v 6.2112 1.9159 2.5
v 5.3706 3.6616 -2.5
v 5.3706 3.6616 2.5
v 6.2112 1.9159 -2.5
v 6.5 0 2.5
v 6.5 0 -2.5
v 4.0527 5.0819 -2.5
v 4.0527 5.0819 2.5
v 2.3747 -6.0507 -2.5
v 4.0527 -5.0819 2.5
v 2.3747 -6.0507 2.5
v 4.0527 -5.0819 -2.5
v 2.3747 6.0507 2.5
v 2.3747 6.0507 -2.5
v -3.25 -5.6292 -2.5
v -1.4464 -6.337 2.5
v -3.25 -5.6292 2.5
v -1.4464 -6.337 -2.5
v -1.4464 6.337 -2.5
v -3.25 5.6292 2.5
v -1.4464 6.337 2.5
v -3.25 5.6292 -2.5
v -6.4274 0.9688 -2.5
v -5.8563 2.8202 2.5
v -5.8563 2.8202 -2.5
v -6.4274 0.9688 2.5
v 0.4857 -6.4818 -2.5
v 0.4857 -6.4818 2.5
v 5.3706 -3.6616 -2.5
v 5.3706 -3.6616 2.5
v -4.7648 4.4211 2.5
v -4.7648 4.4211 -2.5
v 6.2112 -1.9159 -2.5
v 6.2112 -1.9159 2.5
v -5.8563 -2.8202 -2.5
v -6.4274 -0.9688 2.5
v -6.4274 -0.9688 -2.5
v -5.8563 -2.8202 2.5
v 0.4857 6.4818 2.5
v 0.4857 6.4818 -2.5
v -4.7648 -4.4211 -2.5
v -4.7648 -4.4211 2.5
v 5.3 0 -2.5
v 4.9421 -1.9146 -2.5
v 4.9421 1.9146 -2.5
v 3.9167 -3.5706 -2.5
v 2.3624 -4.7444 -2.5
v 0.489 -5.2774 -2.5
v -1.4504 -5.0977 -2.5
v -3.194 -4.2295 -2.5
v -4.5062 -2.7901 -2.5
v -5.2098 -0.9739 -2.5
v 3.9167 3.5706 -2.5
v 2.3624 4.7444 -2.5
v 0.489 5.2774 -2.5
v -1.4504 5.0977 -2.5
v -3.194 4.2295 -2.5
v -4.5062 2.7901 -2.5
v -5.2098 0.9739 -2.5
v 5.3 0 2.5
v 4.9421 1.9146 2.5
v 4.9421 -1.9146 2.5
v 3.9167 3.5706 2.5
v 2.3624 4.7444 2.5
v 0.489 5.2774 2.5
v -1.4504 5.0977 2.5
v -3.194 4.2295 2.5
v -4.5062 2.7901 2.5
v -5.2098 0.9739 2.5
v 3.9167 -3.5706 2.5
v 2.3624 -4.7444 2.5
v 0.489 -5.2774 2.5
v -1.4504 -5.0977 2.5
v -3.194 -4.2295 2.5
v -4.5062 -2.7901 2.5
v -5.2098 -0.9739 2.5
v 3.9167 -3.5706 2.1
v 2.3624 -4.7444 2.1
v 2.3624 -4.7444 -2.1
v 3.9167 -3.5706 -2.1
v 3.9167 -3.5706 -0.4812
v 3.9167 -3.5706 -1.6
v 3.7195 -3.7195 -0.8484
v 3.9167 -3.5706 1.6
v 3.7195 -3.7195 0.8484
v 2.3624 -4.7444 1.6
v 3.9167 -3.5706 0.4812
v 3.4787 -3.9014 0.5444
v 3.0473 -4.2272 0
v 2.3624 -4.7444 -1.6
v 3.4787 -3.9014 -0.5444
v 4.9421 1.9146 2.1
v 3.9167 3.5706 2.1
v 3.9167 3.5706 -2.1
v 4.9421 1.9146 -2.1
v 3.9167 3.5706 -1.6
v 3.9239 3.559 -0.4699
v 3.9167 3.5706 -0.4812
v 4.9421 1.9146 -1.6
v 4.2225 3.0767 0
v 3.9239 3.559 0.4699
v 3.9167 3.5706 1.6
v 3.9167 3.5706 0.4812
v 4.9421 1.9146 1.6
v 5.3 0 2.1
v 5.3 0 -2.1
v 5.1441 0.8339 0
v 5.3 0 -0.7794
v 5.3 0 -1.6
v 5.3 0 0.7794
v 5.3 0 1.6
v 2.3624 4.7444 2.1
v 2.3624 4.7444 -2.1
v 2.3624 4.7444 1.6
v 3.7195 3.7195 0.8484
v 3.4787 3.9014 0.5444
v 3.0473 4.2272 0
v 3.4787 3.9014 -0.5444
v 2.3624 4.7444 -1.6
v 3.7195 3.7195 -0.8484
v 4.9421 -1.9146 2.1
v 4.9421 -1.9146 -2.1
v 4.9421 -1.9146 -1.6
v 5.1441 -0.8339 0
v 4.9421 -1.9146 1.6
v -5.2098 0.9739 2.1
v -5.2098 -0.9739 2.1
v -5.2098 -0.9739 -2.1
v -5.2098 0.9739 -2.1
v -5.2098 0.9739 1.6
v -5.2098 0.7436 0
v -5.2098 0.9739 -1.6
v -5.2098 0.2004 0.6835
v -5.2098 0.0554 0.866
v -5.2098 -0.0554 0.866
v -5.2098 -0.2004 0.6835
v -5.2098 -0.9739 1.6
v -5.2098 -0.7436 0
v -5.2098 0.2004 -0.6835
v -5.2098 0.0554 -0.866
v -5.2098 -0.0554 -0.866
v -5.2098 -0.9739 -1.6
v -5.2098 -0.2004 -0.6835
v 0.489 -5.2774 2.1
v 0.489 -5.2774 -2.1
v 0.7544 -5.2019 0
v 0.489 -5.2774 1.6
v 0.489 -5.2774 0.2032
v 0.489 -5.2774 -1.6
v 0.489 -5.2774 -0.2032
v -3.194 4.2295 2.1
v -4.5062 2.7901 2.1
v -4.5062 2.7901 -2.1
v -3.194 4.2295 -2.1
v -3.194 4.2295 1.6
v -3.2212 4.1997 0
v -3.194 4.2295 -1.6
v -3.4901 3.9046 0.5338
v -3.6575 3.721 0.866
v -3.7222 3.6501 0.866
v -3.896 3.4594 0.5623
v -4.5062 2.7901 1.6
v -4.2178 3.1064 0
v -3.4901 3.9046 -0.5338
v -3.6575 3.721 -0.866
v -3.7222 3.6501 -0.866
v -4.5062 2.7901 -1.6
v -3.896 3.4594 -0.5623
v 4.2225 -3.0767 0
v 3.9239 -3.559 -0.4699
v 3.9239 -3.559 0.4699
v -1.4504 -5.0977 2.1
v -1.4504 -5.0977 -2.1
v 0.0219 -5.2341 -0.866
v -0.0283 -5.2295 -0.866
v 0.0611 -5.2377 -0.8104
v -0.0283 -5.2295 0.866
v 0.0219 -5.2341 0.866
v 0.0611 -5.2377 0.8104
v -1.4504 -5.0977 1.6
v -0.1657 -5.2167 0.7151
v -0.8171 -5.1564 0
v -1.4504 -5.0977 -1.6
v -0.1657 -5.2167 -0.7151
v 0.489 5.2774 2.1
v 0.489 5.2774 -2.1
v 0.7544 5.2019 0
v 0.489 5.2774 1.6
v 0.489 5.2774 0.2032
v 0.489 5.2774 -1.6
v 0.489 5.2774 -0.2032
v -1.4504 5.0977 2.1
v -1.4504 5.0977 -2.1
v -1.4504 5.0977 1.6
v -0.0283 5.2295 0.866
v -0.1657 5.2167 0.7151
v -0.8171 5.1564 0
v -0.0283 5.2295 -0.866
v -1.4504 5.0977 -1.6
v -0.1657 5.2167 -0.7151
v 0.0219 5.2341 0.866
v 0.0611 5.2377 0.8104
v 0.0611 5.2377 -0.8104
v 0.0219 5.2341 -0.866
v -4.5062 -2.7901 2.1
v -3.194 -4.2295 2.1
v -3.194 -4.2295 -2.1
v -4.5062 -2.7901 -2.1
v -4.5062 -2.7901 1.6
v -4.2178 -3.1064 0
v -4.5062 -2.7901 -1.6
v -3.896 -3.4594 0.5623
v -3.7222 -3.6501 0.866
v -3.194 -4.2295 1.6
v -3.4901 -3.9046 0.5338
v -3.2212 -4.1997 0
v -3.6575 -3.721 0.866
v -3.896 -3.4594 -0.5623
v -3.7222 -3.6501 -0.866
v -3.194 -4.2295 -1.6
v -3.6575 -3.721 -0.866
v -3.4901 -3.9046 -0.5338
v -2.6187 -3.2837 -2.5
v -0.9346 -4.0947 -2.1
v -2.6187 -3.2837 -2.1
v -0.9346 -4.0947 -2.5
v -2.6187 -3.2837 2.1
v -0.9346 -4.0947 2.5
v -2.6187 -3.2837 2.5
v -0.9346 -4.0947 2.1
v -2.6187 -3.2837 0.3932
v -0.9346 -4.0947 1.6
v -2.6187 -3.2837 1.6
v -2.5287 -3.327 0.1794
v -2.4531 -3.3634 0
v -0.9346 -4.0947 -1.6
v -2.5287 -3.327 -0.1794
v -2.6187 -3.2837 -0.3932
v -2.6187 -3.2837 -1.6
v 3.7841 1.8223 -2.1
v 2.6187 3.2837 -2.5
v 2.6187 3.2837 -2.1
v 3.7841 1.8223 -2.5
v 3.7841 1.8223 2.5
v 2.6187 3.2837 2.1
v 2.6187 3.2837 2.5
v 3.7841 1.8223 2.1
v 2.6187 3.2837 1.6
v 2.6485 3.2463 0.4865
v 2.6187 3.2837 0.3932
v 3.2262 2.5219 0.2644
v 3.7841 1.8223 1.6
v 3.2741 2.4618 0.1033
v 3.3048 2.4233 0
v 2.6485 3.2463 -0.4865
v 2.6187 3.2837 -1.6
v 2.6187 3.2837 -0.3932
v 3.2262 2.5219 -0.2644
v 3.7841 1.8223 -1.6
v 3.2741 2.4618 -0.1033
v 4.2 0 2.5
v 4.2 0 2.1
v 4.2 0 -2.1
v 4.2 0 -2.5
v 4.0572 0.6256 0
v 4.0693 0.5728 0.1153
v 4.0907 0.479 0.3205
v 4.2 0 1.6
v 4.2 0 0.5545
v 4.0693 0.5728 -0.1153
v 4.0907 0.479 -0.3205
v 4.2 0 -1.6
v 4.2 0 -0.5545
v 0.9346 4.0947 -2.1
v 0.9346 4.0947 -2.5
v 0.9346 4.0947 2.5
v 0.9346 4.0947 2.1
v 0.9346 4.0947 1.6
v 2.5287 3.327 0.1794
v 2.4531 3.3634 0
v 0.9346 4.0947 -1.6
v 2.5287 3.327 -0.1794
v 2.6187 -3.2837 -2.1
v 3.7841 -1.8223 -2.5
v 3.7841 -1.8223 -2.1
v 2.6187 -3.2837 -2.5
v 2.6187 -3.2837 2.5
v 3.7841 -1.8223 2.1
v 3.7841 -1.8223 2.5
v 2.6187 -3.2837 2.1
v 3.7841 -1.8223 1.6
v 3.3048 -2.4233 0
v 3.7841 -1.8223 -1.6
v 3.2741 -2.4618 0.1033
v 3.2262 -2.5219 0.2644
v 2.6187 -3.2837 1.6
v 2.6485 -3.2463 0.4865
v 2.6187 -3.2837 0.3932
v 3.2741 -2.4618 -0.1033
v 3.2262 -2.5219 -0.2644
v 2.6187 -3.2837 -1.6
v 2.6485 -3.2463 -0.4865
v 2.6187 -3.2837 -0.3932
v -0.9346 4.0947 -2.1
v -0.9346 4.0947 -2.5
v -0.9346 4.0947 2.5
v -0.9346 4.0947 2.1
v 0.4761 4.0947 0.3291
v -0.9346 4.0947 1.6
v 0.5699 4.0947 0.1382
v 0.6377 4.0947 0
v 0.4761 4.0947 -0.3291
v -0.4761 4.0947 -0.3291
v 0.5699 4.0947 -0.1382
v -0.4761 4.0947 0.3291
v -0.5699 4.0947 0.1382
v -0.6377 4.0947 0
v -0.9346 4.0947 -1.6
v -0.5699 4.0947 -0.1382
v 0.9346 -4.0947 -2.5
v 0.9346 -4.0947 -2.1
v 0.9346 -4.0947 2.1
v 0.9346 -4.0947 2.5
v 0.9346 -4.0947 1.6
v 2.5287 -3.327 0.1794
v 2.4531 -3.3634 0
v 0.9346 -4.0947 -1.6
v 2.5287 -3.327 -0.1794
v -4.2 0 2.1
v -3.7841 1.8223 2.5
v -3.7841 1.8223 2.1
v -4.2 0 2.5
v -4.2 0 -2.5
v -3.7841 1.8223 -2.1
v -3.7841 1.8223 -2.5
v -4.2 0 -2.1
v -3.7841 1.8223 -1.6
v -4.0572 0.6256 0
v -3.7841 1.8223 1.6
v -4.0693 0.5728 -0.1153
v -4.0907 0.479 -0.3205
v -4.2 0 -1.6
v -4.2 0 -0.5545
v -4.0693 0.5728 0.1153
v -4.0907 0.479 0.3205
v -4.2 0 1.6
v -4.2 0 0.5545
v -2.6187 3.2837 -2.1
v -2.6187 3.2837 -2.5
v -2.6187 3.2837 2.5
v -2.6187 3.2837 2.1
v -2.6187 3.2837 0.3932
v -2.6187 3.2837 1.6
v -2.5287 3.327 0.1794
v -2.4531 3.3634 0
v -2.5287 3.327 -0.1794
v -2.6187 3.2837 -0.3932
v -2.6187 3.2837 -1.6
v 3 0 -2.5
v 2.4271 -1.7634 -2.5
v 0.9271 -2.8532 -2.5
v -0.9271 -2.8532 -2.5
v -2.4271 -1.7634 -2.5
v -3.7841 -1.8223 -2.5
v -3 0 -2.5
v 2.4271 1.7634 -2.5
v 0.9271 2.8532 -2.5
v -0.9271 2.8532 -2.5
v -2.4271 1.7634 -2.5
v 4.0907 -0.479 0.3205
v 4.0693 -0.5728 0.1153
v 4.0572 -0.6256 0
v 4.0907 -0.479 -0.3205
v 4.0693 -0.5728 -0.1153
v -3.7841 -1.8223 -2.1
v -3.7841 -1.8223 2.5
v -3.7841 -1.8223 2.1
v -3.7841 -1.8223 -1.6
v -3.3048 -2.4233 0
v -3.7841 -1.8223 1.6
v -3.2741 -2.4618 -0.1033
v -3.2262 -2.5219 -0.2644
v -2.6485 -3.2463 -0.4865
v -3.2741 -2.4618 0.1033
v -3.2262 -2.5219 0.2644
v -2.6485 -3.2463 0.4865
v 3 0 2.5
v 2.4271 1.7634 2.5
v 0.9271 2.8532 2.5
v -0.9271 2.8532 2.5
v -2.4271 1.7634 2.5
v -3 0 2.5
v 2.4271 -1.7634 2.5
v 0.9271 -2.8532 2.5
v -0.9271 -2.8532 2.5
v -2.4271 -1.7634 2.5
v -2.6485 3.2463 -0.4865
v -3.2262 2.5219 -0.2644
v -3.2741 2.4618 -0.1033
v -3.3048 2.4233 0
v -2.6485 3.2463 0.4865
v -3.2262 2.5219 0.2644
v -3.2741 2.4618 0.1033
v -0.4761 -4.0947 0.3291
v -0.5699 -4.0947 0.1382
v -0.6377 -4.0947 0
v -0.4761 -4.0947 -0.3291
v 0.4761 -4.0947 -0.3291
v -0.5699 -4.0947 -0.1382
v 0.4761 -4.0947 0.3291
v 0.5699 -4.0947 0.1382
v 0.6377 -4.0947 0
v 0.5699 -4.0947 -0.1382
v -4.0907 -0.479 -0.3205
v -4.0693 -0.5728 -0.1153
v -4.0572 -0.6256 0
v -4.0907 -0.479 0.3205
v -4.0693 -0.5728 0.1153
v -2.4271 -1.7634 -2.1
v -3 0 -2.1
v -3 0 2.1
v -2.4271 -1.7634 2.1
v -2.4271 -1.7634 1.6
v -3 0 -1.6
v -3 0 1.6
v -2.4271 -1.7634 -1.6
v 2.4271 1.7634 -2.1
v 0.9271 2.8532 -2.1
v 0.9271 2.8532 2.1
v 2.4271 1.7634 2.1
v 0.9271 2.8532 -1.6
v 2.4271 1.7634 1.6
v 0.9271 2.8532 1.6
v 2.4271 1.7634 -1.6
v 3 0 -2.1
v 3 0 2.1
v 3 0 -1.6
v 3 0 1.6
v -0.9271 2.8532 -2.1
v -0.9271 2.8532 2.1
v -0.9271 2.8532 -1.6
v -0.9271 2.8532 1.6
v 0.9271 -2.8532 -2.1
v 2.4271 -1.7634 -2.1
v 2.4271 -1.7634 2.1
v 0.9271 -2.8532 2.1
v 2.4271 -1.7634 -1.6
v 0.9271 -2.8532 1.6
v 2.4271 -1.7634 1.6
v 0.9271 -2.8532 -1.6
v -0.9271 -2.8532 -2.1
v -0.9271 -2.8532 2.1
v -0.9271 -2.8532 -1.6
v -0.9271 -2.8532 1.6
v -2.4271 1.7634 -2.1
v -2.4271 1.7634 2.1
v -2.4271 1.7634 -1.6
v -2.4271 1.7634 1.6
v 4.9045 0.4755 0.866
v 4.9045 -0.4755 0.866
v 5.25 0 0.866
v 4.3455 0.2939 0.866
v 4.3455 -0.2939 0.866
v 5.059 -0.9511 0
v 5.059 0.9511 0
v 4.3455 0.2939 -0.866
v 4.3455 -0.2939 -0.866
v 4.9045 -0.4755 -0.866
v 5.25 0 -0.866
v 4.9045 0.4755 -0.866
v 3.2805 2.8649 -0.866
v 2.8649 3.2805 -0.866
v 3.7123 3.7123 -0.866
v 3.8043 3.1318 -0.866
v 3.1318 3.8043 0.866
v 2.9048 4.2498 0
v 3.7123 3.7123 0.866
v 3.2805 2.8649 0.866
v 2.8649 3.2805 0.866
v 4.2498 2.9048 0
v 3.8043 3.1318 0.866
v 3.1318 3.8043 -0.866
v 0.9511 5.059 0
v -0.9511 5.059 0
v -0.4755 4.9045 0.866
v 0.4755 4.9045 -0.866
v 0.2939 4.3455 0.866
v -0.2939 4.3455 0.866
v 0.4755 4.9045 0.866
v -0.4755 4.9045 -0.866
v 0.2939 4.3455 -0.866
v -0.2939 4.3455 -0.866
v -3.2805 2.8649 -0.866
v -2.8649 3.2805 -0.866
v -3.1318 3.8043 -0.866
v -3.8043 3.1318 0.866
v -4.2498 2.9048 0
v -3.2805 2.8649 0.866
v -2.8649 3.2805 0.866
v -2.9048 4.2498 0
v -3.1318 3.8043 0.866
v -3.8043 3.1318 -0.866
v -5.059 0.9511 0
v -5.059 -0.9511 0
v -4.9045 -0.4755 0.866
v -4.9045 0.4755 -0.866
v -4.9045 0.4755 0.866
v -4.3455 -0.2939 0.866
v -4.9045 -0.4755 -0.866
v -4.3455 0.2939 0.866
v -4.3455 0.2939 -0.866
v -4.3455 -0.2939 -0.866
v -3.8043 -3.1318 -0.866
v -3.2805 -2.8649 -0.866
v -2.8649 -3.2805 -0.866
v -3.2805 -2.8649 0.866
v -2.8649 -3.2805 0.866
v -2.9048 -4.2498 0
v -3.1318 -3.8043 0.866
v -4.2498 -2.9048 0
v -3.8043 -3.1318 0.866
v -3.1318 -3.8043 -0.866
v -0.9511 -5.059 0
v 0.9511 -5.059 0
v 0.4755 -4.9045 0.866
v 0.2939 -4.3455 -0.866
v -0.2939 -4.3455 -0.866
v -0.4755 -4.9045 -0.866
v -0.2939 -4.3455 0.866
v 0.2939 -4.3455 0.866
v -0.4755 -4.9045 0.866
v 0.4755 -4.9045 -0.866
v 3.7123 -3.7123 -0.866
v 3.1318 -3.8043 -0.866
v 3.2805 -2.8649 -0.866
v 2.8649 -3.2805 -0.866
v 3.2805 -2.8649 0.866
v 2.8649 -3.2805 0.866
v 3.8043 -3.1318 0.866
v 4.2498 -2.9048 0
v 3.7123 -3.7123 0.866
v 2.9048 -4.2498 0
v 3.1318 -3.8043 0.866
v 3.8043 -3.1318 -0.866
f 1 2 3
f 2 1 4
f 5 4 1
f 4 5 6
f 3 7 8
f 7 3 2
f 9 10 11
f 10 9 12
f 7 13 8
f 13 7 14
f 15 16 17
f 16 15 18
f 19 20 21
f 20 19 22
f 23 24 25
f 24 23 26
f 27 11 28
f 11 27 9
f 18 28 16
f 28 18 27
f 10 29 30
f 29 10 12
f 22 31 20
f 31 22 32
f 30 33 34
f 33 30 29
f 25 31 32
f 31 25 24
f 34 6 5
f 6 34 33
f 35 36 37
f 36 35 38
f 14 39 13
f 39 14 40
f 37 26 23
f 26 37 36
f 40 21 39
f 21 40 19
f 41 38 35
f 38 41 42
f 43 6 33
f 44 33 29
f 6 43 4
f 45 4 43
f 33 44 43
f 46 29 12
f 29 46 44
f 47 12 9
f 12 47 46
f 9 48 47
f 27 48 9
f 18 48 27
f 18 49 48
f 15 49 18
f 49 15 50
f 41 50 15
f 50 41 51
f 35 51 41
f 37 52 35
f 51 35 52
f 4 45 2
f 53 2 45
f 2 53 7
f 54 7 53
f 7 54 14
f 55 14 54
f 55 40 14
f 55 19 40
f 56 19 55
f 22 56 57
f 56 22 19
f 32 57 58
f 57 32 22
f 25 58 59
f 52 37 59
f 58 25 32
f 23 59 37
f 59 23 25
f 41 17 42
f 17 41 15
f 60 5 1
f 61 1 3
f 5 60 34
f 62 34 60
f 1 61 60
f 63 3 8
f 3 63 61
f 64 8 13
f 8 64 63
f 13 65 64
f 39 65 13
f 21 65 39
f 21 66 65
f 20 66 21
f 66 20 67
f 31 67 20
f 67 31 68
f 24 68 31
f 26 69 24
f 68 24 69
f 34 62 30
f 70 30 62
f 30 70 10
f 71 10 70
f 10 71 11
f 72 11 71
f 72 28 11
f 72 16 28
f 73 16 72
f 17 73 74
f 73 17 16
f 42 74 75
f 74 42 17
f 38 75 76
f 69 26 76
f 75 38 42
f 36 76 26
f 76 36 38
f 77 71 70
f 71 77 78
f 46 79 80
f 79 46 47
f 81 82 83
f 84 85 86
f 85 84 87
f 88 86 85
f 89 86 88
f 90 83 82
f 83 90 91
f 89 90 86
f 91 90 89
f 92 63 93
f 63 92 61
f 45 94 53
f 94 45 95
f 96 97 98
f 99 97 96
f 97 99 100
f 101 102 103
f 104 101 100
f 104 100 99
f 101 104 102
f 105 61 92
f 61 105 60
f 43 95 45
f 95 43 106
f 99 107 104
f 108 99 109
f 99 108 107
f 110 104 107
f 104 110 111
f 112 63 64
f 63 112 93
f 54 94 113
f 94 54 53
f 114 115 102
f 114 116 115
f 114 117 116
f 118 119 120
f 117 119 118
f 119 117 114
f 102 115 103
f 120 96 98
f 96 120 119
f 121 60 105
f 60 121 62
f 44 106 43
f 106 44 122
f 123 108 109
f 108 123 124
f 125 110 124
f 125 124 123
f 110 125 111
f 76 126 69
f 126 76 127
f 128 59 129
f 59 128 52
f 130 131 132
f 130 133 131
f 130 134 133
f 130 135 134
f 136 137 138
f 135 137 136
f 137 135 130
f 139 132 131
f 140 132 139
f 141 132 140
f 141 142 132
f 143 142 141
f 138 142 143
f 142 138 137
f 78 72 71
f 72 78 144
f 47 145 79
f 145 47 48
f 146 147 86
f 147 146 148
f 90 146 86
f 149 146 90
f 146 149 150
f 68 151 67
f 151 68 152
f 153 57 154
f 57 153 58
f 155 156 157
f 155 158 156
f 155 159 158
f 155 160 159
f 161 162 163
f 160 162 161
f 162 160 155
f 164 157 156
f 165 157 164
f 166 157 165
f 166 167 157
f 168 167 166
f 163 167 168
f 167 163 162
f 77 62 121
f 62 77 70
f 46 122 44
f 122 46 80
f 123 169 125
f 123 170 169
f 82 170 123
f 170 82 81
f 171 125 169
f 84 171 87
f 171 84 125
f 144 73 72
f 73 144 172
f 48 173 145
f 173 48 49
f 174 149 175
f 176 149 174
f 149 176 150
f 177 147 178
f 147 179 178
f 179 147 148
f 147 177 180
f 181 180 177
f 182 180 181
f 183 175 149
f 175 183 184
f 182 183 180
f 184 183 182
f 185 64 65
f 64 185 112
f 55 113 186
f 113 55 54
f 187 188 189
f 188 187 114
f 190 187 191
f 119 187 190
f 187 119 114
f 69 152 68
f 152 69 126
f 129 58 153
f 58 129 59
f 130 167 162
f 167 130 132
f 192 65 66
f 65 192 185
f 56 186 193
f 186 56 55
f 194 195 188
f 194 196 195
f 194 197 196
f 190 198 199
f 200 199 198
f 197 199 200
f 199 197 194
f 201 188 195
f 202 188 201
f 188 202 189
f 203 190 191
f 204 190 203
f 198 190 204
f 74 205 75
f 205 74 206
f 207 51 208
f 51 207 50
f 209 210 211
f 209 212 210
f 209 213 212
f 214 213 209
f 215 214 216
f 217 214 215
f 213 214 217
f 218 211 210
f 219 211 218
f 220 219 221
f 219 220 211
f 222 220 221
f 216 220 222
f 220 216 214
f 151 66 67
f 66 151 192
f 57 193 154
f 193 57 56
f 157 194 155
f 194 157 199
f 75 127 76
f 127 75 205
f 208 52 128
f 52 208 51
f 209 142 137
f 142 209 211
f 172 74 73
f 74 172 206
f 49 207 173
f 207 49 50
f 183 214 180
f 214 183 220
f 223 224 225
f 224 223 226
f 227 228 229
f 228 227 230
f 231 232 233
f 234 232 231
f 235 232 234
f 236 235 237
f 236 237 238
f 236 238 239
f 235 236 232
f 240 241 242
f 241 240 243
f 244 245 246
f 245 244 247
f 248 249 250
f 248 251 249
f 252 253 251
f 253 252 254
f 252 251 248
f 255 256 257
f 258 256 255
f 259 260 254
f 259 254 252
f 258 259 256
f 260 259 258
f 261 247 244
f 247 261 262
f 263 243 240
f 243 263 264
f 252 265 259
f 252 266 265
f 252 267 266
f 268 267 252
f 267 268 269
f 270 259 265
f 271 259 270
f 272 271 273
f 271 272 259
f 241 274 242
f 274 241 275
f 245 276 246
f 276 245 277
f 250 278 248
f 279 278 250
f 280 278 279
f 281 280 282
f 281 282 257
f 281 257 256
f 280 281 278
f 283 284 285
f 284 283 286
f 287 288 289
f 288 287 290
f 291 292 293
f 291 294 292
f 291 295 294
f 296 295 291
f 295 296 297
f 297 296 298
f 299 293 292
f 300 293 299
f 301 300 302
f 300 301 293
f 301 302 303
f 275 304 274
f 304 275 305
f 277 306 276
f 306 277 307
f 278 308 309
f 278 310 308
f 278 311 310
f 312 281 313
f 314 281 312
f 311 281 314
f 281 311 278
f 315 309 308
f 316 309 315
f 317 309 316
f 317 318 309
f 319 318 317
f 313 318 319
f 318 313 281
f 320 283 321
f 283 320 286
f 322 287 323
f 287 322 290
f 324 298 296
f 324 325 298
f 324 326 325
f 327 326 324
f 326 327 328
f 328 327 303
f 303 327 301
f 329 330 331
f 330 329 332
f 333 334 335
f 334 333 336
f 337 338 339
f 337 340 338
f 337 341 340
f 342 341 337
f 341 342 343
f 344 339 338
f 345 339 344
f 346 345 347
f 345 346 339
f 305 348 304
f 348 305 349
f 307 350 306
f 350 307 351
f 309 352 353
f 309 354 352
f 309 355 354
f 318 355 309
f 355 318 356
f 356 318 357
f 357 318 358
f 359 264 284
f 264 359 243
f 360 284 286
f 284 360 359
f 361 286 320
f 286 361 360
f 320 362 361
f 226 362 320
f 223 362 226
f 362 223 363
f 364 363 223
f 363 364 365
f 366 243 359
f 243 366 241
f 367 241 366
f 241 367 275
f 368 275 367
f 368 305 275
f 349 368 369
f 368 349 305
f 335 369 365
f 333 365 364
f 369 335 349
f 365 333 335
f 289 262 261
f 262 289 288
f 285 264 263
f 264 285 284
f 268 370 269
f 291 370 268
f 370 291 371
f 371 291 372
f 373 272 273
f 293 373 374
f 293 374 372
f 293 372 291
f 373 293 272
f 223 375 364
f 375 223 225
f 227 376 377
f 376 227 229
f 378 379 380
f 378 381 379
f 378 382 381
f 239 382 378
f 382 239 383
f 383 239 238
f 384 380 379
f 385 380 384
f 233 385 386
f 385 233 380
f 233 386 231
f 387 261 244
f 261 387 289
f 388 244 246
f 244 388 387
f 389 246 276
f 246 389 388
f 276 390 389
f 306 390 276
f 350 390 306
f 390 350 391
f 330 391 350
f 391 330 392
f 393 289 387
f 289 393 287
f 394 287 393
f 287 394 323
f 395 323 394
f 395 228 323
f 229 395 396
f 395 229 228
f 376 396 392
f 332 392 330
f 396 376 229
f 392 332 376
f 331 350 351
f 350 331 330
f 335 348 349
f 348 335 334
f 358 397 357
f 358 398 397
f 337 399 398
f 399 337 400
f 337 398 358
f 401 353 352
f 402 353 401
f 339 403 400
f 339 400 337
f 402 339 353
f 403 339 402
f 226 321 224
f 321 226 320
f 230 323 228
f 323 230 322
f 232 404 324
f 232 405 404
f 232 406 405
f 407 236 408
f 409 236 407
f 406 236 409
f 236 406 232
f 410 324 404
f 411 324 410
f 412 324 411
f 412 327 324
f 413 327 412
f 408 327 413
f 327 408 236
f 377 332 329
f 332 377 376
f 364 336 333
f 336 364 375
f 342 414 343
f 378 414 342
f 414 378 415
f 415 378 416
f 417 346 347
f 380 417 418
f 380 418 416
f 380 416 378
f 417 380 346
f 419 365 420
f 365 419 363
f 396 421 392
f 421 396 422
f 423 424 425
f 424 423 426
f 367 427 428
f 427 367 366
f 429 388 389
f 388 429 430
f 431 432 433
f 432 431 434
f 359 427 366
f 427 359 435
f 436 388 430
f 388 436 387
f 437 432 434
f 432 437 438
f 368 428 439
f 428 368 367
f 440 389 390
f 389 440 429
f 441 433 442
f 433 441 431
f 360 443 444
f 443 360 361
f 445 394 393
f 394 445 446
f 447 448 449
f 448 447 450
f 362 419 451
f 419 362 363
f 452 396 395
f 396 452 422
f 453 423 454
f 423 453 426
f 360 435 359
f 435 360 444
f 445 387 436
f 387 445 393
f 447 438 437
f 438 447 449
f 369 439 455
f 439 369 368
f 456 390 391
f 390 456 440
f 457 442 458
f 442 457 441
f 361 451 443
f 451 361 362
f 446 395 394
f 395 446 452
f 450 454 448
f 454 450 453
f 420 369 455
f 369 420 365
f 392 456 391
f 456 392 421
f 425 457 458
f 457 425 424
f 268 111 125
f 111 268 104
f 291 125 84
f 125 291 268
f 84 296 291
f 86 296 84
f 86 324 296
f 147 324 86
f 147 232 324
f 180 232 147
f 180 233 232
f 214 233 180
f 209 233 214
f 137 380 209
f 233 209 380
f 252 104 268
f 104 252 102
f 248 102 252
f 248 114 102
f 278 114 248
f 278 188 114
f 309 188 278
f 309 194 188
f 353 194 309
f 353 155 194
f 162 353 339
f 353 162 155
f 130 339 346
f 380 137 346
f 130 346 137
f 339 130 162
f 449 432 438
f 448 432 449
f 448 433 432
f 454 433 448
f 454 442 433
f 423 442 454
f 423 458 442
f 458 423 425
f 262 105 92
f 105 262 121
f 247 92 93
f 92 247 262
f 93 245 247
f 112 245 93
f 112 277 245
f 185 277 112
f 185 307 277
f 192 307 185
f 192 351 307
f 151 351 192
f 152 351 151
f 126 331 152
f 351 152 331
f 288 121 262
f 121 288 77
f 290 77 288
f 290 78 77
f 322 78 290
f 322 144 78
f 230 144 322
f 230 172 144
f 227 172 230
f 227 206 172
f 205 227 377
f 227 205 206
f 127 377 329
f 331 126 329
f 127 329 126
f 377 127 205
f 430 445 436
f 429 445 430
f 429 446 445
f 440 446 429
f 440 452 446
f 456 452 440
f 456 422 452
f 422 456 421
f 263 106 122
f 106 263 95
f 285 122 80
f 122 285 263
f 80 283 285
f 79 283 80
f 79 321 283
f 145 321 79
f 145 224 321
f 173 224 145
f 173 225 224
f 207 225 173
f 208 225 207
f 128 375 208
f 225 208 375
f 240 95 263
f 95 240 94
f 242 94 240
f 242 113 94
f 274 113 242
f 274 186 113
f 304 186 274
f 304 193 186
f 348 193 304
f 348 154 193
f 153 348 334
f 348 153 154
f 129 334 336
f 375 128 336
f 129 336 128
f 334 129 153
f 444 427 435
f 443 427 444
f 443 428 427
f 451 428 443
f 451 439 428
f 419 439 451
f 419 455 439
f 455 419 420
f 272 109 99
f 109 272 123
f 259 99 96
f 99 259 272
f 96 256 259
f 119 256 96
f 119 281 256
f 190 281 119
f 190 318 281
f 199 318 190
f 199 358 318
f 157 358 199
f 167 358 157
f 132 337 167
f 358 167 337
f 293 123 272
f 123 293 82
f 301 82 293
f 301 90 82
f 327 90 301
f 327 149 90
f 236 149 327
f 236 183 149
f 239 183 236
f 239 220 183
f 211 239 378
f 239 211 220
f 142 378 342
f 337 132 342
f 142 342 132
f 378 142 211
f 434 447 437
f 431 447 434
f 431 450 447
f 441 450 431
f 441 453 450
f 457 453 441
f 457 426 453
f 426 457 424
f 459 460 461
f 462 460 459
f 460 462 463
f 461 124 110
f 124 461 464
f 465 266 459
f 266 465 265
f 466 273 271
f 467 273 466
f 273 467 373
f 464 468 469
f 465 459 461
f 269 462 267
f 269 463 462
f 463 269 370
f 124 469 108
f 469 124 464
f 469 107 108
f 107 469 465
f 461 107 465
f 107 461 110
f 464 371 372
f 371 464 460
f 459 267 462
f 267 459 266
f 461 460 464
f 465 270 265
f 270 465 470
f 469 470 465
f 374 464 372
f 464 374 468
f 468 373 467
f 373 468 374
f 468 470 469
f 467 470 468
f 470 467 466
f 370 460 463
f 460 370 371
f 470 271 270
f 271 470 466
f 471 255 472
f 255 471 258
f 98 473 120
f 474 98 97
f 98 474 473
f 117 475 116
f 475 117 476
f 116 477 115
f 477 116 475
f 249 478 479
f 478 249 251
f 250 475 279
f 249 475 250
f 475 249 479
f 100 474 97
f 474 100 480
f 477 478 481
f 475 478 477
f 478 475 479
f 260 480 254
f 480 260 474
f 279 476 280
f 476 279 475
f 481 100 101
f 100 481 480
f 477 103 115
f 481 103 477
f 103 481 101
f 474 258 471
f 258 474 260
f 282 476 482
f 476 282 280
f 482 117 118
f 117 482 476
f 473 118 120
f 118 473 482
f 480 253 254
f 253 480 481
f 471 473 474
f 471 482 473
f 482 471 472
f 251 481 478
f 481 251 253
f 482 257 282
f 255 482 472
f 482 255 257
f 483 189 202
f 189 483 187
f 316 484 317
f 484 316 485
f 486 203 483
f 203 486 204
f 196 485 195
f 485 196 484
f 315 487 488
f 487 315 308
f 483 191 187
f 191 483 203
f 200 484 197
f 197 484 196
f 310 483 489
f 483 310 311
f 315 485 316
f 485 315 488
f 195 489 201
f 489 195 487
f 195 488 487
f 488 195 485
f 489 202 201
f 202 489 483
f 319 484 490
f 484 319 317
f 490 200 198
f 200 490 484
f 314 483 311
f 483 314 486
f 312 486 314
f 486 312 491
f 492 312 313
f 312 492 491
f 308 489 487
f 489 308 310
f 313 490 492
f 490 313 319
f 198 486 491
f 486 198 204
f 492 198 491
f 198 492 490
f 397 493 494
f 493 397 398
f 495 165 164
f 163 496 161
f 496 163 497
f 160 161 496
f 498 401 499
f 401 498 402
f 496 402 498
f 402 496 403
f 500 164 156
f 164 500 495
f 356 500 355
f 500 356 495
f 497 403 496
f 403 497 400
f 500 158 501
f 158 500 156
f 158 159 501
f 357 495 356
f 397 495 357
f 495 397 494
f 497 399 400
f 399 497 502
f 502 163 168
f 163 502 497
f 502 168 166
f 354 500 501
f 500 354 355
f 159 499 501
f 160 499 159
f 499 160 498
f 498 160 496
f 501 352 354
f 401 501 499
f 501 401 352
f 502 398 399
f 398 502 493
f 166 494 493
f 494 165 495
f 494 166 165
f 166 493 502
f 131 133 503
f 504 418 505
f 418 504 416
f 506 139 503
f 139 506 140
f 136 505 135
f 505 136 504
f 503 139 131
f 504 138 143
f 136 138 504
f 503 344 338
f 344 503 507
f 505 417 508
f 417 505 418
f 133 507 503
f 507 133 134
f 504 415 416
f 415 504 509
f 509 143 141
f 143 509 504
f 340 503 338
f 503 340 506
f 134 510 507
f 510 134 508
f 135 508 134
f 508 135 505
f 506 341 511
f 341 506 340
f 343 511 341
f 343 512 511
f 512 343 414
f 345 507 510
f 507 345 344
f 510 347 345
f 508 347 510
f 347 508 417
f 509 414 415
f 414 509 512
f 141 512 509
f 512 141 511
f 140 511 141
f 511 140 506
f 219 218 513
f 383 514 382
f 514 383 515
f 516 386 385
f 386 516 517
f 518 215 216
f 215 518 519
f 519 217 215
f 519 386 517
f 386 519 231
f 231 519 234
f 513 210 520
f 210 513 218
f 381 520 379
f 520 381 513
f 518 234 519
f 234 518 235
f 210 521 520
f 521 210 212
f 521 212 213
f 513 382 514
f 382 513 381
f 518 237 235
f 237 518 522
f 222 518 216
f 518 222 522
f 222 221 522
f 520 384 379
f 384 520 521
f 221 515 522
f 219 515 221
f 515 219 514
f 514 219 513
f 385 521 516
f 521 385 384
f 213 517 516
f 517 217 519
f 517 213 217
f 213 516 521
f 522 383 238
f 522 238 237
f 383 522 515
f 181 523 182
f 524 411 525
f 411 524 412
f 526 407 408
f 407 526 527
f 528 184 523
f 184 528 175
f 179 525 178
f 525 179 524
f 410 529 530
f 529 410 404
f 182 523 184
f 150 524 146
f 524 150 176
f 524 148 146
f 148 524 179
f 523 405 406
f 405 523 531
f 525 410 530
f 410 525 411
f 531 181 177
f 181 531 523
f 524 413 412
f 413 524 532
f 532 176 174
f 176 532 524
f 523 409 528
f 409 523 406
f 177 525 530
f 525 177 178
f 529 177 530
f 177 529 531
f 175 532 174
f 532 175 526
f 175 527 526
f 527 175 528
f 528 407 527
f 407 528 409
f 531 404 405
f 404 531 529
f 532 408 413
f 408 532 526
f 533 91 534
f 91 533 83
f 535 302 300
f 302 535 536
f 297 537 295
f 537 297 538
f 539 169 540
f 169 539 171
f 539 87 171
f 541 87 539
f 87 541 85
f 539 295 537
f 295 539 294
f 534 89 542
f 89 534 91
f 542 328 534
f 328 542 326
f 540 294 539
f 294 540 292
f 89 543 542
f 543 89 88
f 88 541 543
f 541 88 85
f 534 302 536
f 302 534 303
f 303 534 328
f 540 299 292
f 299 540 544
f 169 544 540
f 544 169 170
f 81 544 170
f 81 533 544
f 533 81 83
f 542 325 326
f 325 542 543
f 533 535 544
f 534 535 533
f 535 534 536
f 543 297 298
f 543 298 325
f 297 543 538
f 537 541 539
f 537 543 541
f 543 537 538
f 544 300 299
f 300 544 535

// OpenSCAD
// Parameters
bore_diameter_mm = 6; //[3:12:0.1]
outer_diameter_mm = 13; //[6.5:26:0.1]
width_mm = 5; //[2.5:10:0.1]
shield_type = 0; //[0:1:1]
eps_mm = 0.8; //[0.3:2:0.1]
outer_rim_radial_mm = 1.2; //[0.6:2.4:0.1]
inner_race_radial_mm = 1.2; //[0.6:2.4:0.1]
shield_thickness_mm = 0.5; //[0.3:1.2:0.1]
shield_radial_overlap_mm = 0.6; //[0.2:1.5:0.1]
ball_diameter_mm = 2.0; //[1.2:3:0.1]
ball_count = 8; //[6:12:1]

// Bearing Ball - complete geometry
module bearing_ball() {
  color("Silver") {
    sphere(r=ball_diameter_mm/2);
  }
}

// Ball Bearing - complete geometry
module ball_bearing() {
  color("DimGray") {
    // Outer Race
    difference() {
      cylinder(r=outer_diameter_mm/2, h=width_mm, center=true);
      cylinder(r=outer_diameter_mm/2 - outer_rim_radial_mm, h=width_mm + 2*eps_mm, center=true);
    }
    // Inner Race
    difference() {
      cylinder(r=bore_diameter_mm/2 + inner_race_radial_mm, h=width_mm, center=true);
      cylinder(r=bore_diameter_mm/2, h=width_mm + 2*eps_mm, center=true);
    }
    // Shields/Seals
    union() {
      translate([0, 0, width_mm/2 - shield_thickness_mm/2 - eps_mm/2])
        cylinder(r=outer_diameter_mm/2 - outer_rim_radial_mm + shield_radial_overlap_mm, h=shield_thickness_mm, center=true);
      translate([0, 0, -width_mm/2 + shield_thickness_mm/2 + eps_mm/2])
        cylinder(r=outer_diameter_mm/2 - outer_rim_radial_mm + shield_radial_overlap_mm, h=shield_thickness_mm, center=true);
    }
  }
  // Bearing Balls
  for (i = [0:ball_count-1]) {
    rotate([0, 0, i*360/ball_count])
      translate([(bore_diameter_mm/2 + inner_race_radial_mm + (outer_diameter_mm/2 - outer_rim_radial_mm))/2, 0, 0])
        bearing_ball();
  }
}

// Assembly
module assembly() {
  ball_bearing();
}

assembly();
